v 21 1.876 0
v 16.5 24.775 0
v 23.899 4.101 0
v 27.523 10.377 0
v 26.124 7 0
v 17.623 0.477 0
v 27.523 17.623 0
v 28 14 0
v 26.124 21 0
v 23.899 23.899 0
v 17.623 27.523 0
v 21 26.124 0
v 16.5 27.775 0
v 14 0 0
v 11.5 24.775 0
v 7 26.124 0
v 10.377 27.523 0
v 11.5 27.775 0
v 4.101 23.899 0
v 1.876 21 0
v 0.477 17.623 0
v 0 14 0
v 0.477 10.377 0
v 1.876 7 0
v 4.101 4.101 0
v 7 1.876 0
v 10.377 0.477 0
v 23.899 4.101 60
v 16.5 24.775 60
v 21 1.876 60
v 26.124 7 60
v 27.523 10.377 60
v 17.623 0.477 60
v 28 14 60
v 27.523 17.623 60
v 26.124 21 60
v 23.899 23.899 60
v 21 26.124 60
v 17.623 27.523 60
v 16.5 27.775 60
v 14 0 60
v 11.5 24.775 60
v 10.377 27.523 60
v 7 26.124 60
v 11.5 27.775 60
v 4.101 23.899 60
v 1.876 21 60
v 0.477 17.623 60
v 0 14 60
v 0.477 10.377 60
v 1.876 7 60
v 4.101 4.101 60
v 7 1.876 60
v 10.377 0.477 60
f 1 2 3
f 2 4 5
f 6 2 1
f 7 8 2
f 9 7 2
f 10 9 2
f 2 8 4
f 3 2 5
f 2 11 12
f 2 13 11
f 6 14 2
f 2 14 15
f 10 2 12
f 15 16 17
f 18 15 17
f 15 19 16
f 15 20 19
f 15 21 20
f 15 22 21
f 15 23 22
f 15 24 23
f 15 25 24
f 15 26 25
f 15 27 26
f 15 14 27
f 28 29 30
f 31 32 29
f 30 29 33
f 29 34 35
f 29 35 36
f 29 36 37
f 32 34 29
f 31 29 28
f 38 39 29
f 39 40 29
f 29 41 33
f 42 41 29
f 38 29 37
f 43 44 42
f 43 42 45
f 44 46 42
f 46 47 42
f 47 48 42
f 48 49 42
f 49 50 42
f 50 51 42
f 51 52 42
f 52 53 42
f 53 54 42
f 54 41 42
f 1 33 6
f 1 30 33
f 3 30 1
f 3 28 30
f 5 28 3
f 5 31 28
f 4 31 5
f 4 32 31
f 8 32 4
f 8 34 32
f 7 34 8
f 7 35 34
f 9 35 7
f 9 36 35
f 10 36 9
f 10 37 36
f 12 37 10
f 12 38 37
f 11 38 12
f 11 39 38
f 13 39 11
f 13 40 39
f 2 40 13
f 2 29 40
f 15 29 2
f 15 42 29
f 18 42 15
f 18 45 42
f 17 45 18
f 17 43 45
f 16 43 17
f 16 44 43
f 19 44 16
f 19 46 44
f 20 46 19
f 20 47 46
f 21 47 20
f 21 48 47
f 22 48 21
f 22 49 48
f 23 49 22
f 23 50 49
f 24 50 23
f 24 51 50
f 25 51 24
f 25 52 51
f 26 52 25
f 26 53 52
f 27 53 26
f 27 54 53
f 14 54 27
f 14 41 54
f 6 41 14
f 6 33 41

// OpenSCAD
$fn = 32;

// ----------------------------------------------------------------------
// Keyway shaft: d28 shaft, key 5 x 3 mm
// ----------------------------------------------------------------------

// --- parameters (mm) ---
shaft_r = 14;             // shaft radius
key_w = 5;                // keyway width
key_d = 3;                // keyway depth below the surface line
plate_t = 60;             // shaft length, Z (extrusion height)

shaft_d = 2 * shaft_r;  // shaft diameter
circle_step = 15;  // polygon sampling step, degrees

profile = [[10.377, 27.523], [7, 26.124], [4.101, 23.899], [1.876, 21], [0.477, 17.623], [0, 14], [0.477, 10.377], [1.876, 7], [4.101, 4.101], [7, 1.876], [10.377, 0.477], [14, 0], [17.623, 0.477], [21, 1.876], [23.899, 4.101], [26.124, 7], [27.523, 10.377], [28, 14], [27.523, 17.623], [26.124, 21], [23.899, 23.899], [21, 26.124], [17.623, 27.523], [16.5, 27.775], [16.5, 24.775], [11.5, 24.775], [11.5, 27.775]];  // primary outline, 27 points, counter clockwise

// --- the one profile operation ---
linear_extrude(height = plate_t) polygon(points = profile);
